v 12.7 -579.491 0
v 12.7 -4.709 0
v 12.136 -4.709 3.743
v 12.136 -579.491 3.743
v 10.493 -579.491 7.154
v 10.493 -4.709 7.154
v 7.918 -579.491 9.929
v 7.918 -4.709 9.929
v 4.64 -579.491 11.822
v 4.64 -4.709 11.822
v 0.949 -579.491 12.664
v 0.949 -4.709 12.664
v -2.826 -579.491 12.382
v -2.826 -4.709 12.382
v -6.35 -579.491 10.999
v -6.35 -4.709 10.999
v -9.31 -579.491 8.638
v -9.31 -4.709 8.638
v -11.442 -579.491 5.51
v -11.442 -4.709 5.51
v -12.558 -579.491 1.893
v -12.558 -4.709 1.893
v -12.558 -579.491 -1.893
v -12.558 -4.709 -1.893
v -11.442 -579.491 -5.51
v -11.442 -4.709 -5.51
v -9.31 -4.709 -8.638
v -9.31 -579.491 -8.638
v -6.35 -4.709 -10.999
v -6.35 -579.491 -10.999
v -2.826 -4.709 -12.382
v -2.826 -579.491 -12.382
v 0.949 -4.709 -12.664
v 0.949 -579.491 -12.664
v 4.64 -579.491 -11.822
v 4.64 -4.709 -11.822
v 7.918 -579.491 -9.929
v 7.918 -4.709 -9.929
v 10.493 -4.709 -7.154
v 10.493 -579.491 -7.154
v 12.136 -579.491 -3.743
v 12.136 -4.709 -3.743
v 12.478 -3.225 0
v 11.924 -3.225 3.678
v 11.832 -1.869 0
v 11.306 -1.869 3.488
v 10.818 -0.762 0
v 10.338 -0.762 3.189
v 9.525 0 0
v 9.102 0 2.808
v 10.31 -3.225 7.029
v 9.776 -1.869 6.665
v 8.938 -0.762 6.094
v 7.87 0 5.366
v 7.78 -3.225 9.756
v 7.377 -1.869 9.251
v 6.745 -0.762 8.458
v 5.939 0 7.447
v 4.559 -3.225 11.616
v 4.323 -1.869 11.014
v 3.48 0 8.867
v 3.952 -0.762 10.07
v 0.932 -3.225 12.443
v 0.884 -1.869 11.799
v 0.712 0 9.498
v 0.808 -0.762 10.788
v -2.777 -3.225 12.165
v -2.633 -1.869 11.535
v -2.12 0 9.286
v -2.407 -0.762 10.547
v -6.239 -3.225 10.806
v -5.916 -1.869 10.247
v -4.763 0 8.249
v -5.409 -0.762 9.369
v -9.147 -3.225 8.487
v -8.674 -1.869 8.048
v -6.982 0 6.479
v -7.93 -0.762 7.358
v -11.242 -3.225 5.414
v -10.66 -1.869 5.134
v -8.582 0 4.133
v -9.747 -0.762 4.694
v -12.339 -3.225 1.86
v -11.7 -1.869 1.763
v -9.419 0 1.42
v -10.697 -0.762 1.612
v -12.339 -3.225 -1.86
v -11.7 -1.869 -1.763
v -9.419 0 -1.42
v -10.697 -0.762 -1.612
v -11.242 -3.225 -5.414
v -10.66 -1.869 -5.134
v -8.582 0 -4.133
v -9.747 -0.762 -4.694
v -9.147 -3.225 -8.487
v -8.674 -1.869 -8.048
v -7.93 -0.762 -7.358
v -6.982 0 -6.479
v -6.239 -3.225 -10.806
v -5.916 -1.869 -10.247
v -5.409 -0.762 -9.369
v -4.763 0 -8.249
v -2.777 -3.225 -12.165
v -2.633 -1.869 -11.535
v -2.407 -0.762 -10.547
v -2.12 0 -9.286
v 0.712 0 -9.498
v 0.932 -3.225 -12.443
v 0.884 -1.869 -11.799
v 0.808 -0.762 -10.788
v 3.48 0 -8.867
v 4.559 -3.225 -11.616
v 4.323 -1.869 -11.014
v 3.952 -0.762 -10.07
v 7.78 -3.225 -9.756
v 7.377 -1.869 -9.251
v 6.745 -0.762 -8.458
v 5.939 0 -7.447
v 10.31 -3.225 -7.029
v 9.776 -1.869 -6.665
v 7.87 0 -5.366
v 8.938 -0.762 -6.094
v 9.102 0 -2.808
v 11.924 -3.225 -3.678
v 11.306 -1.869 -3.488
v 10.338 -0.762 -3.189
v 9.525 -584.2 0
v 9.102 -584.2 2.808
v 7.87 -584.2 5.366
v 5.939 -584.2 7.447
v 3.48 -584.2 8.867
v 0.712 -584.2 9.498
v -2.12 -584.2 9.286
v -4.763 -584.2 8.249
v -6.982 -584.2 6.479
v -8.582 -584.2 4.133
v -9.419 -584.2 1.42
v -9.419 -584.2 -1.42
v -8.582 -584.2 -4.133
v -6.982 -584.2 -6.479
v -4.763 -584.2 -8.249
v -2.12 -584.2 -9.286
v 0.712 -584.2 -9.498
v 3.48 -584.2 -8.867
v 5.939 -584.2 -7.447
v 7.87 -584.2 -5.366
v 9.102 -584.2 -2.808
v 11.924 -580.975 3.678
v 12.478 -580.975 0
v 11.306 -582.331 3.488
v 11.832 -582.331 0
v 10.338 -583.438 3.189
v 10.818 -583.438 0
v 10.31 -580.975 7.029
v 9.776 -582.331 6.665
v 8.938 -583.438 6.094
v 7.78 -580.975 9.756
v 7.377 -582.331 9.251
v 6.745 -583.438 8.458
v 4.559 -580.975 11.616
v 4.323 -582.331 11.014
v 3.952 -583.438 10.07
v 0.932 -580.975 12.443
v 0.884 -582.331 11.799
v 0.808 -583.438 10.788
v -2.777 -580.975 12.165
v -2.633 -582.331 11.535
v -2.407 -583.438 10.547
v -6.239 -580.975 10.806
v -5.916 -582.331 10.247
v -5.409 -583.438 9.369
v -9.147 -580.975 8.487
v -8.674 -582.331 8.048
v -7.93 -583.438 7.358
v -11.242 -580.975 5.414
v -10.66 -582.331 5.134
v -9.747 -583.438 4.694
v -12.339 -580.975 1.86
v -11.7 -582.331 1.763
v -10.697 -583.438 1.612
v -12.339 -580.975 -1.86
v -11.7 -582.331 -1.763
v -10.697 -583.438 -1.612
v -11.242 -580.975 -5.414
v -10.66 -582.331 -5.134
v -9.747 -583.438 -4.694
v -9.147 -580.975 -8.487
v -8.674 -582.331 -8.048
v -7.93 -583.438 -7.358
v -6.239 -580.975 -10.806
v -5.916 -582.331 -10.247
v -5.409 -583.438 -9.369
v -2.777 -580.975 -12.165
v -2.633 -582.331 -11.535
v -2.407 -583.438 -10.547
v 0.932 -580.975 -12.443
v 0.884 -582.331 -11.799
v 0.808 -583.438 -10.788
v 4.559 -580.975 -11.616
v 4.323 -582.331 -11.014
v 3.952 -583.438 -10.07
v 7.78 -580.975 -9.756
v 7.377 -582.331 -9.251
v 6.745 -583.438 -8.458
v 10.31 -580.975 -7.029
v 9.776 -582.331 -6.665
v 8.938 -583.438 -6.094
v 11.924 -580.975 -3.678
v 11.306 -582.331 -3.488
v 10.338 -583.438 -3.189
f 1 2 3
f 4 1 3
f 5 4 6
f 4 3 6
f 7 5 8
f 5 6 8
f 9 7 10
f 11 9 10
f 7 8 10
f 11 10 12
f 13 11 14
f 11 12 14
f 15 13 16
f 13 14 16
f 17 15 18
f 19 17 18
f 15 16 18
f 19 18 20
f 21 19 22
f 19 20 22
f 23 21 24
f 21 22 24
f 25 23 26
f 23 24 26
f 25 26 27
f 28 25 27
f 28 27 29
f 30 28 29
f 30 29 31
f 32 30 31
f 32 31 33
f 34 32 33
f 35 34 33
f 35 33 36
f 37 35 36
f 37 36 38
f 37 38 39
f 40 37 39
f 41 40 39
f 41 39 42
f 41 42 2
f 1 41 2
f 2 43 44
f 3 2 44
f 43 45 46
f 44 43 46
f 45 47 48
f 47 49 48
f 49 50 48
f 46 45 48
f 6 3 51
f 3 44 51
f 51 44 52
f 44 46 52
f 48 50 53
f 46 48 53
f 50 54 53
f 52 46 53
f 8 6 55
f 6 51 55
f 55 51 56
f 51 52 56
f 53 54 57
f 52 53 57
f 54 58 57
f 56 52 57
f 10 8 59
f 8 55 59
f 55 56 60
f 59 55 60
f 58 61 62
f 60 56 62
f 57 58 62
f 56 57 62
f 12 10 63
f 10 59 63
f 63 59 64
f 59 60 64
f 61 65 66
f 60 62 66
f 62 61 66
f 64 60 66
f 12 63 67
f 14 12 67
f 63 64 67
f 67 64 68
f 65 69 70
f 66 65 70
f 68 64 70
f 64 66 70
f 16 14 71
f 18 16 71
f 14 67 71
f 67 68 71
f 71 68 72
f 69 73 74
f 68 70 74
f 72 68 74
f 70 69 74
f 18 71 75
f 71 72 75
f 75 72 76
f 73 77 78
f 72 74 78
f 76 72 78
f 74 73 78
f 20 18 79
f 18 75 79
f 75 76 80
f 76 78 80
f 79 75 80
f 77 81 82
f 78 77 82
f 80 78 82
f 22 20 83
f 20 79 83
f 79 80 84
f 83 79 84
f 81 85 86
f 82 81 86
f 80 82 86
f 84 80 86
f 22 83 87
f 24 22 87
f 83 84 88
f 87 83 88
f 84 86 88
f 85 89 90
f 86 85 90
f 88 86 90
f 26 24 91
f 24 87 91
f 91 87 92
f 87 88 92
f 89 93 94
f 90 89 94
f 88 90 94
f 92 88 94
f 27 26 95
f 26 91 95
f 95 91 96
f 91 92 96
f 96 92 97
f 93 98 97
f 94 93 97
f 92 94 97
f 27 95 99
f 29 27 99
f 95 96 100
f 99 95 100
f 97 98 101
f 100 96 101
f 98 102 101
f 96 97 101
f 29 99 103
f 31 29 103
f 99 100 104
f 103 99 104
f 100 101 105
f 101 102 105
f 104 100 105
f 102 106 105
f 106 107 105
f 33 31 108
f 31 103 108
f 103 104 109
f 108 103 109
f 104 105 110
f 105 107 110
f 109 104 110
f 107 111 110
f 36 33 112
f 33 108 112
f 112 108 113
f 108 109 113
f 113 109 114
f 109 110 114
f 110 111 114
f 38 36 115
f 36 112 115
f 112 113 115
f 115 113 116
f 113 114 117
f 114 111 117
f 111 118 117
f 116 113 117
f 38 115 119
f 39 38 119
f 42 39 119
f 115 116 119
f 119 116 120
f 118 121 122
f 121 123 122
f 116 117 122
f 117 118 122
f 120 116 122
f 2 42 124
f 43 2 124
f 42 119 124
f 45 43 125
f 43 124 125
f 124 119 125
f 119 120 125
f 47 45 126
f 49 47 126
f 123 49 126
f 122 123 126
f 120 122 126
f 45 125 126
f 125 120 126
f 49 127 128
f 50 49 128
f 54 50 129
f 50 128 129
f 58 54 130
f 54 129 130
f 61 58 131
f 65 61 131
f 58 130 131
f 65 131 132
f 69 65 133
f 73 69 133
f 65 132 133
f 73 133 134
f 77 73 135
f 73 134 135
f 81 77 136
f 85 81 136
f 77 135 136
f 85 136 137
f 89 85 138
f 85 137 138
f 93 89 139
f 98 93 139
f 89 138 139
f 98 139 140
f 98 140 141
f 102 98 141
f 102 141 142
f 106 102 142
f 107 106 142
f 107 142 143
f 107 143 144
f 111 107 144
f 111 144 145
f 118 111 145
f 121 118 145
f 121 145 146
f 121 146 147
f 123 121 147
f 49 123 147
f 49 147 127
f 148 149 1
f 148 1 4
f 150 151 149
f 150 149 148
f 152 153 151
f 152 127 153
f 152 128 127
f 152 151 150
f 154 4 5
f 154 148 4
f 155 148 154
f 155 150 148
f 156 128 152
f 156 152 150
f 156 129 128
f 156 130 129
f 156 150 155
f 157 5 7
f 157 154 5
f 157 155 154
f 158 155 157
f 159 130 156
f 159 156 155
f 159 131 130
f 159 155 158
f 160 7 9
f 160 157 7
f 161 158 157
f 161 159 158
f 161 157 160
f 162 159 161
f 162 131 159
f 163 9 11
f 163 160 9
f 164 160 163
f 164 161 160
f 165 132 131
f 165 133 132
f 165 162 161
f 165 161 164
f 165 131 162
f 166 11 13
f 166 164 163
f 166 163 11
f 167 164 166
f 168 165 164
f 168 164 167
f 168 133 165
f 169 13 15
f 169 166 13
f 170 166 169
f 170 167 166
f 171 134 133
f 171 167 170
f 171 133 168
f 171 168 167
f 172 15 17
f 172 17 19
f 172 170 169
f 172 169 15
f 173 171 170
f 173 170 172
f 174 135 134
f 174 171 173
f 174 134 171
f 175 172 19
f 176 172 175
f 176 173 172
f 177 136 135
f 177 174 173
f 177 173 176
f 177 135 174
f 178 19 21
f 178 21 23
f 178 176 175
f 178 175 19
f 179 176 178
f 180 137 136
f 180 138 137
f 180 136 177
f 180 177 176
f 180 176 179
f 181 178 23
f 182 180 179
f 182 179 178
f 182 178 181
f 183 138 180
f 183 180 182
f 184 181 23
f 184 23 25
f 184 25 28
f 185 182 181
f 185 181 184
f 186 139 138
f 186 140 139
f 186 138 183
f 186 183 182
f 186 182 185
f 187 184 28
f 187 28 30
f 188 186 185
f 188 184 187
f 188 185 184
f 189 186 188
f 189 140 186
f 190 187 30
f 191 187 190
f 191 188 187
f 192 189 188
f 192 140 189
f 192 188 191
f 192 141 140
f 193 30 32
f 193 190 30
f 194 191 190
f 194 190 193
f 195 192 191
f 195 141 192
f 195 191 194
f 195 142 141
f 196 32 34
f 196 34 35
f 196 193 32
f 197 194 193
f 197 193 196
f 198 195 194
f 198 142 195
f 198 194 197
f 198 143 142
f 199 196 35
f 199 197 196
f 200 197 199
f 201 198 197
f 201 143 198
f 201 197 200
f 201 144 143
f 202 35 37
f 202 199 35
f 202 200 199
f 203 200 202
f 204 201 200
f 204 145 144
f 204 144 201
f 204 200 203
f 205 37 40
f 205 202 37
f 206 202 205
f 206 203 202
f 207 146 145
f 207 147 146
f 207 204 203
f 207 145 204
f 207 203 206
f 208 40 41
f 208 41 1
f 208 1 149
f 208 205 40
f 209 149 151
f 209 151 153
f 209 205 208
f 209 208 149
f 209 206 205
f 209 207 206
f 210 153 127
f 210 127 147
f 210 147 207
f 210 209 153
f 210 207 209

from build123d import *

# Parameters (mm, degrees)
F0_R     = 12.7
F1_DEPTH = 584.2
F2_R     = 9.525
F3_DEPTH = 584.201


# Not quite as in the source:
# - a fillet or chamfer that OpenCascade refuses, or shapes differently, is made with other operations: its cross-section is extruded or revolved along the edge and cut away or added


with BuildPart() as f1:
    # F0 (on Front) → F1 (new body)
    with BuildSketch(Plane.XZ):
        Circle(F0_R)
    extrude(amount=F1_DEPTH)

    # F2 (on face) → F3 (cut, through all)
    with BuildSketch(Plane.XZ.offset(584.2)):
        Circle(F2_R)
    extrude(amount=-F3_DEPTH, mode=Mode.SUBTRACT)

    # F4: fillet of radius 5.08 on 2 edges, made by hand

    # F4_s1 → F4_t2 (revolve, cut)
    with BuildSketch(Plane.XY):
        with BuildLine():
            ThreePointArc((12.7, -579.4907139607), (11.8321134838, -582.3305202921), (9.525, -584.2))
            Line((9.525, -584.2), (12.7, -584.2))
            Line((12.7, -584.2), (12.7, -579.4907139607))
        make_face()
    revolve(axis=Axis((0, -584.2, 0), (0, -1, 0)), mode=Mode.SUBTRACT)

    # F4_s3 → F4_t4 (revolve, cut)
    with BuildSketch(Plane.XY):
        with BuildLine():
            ThreePointArc((12.7, -4.7092860393), (11.8321134838, -1.8694797079), (9.525, 0))
            Line((9.525, 0), (12.7, 0))
            Line((12.7, 0), (12.7, -4.7092860393))
        make_face()
    revolve(axis=Axis((0, 0, 0), (0, -1, 0)), mode=Mode.SUBTRACT)


solid = f1.part
